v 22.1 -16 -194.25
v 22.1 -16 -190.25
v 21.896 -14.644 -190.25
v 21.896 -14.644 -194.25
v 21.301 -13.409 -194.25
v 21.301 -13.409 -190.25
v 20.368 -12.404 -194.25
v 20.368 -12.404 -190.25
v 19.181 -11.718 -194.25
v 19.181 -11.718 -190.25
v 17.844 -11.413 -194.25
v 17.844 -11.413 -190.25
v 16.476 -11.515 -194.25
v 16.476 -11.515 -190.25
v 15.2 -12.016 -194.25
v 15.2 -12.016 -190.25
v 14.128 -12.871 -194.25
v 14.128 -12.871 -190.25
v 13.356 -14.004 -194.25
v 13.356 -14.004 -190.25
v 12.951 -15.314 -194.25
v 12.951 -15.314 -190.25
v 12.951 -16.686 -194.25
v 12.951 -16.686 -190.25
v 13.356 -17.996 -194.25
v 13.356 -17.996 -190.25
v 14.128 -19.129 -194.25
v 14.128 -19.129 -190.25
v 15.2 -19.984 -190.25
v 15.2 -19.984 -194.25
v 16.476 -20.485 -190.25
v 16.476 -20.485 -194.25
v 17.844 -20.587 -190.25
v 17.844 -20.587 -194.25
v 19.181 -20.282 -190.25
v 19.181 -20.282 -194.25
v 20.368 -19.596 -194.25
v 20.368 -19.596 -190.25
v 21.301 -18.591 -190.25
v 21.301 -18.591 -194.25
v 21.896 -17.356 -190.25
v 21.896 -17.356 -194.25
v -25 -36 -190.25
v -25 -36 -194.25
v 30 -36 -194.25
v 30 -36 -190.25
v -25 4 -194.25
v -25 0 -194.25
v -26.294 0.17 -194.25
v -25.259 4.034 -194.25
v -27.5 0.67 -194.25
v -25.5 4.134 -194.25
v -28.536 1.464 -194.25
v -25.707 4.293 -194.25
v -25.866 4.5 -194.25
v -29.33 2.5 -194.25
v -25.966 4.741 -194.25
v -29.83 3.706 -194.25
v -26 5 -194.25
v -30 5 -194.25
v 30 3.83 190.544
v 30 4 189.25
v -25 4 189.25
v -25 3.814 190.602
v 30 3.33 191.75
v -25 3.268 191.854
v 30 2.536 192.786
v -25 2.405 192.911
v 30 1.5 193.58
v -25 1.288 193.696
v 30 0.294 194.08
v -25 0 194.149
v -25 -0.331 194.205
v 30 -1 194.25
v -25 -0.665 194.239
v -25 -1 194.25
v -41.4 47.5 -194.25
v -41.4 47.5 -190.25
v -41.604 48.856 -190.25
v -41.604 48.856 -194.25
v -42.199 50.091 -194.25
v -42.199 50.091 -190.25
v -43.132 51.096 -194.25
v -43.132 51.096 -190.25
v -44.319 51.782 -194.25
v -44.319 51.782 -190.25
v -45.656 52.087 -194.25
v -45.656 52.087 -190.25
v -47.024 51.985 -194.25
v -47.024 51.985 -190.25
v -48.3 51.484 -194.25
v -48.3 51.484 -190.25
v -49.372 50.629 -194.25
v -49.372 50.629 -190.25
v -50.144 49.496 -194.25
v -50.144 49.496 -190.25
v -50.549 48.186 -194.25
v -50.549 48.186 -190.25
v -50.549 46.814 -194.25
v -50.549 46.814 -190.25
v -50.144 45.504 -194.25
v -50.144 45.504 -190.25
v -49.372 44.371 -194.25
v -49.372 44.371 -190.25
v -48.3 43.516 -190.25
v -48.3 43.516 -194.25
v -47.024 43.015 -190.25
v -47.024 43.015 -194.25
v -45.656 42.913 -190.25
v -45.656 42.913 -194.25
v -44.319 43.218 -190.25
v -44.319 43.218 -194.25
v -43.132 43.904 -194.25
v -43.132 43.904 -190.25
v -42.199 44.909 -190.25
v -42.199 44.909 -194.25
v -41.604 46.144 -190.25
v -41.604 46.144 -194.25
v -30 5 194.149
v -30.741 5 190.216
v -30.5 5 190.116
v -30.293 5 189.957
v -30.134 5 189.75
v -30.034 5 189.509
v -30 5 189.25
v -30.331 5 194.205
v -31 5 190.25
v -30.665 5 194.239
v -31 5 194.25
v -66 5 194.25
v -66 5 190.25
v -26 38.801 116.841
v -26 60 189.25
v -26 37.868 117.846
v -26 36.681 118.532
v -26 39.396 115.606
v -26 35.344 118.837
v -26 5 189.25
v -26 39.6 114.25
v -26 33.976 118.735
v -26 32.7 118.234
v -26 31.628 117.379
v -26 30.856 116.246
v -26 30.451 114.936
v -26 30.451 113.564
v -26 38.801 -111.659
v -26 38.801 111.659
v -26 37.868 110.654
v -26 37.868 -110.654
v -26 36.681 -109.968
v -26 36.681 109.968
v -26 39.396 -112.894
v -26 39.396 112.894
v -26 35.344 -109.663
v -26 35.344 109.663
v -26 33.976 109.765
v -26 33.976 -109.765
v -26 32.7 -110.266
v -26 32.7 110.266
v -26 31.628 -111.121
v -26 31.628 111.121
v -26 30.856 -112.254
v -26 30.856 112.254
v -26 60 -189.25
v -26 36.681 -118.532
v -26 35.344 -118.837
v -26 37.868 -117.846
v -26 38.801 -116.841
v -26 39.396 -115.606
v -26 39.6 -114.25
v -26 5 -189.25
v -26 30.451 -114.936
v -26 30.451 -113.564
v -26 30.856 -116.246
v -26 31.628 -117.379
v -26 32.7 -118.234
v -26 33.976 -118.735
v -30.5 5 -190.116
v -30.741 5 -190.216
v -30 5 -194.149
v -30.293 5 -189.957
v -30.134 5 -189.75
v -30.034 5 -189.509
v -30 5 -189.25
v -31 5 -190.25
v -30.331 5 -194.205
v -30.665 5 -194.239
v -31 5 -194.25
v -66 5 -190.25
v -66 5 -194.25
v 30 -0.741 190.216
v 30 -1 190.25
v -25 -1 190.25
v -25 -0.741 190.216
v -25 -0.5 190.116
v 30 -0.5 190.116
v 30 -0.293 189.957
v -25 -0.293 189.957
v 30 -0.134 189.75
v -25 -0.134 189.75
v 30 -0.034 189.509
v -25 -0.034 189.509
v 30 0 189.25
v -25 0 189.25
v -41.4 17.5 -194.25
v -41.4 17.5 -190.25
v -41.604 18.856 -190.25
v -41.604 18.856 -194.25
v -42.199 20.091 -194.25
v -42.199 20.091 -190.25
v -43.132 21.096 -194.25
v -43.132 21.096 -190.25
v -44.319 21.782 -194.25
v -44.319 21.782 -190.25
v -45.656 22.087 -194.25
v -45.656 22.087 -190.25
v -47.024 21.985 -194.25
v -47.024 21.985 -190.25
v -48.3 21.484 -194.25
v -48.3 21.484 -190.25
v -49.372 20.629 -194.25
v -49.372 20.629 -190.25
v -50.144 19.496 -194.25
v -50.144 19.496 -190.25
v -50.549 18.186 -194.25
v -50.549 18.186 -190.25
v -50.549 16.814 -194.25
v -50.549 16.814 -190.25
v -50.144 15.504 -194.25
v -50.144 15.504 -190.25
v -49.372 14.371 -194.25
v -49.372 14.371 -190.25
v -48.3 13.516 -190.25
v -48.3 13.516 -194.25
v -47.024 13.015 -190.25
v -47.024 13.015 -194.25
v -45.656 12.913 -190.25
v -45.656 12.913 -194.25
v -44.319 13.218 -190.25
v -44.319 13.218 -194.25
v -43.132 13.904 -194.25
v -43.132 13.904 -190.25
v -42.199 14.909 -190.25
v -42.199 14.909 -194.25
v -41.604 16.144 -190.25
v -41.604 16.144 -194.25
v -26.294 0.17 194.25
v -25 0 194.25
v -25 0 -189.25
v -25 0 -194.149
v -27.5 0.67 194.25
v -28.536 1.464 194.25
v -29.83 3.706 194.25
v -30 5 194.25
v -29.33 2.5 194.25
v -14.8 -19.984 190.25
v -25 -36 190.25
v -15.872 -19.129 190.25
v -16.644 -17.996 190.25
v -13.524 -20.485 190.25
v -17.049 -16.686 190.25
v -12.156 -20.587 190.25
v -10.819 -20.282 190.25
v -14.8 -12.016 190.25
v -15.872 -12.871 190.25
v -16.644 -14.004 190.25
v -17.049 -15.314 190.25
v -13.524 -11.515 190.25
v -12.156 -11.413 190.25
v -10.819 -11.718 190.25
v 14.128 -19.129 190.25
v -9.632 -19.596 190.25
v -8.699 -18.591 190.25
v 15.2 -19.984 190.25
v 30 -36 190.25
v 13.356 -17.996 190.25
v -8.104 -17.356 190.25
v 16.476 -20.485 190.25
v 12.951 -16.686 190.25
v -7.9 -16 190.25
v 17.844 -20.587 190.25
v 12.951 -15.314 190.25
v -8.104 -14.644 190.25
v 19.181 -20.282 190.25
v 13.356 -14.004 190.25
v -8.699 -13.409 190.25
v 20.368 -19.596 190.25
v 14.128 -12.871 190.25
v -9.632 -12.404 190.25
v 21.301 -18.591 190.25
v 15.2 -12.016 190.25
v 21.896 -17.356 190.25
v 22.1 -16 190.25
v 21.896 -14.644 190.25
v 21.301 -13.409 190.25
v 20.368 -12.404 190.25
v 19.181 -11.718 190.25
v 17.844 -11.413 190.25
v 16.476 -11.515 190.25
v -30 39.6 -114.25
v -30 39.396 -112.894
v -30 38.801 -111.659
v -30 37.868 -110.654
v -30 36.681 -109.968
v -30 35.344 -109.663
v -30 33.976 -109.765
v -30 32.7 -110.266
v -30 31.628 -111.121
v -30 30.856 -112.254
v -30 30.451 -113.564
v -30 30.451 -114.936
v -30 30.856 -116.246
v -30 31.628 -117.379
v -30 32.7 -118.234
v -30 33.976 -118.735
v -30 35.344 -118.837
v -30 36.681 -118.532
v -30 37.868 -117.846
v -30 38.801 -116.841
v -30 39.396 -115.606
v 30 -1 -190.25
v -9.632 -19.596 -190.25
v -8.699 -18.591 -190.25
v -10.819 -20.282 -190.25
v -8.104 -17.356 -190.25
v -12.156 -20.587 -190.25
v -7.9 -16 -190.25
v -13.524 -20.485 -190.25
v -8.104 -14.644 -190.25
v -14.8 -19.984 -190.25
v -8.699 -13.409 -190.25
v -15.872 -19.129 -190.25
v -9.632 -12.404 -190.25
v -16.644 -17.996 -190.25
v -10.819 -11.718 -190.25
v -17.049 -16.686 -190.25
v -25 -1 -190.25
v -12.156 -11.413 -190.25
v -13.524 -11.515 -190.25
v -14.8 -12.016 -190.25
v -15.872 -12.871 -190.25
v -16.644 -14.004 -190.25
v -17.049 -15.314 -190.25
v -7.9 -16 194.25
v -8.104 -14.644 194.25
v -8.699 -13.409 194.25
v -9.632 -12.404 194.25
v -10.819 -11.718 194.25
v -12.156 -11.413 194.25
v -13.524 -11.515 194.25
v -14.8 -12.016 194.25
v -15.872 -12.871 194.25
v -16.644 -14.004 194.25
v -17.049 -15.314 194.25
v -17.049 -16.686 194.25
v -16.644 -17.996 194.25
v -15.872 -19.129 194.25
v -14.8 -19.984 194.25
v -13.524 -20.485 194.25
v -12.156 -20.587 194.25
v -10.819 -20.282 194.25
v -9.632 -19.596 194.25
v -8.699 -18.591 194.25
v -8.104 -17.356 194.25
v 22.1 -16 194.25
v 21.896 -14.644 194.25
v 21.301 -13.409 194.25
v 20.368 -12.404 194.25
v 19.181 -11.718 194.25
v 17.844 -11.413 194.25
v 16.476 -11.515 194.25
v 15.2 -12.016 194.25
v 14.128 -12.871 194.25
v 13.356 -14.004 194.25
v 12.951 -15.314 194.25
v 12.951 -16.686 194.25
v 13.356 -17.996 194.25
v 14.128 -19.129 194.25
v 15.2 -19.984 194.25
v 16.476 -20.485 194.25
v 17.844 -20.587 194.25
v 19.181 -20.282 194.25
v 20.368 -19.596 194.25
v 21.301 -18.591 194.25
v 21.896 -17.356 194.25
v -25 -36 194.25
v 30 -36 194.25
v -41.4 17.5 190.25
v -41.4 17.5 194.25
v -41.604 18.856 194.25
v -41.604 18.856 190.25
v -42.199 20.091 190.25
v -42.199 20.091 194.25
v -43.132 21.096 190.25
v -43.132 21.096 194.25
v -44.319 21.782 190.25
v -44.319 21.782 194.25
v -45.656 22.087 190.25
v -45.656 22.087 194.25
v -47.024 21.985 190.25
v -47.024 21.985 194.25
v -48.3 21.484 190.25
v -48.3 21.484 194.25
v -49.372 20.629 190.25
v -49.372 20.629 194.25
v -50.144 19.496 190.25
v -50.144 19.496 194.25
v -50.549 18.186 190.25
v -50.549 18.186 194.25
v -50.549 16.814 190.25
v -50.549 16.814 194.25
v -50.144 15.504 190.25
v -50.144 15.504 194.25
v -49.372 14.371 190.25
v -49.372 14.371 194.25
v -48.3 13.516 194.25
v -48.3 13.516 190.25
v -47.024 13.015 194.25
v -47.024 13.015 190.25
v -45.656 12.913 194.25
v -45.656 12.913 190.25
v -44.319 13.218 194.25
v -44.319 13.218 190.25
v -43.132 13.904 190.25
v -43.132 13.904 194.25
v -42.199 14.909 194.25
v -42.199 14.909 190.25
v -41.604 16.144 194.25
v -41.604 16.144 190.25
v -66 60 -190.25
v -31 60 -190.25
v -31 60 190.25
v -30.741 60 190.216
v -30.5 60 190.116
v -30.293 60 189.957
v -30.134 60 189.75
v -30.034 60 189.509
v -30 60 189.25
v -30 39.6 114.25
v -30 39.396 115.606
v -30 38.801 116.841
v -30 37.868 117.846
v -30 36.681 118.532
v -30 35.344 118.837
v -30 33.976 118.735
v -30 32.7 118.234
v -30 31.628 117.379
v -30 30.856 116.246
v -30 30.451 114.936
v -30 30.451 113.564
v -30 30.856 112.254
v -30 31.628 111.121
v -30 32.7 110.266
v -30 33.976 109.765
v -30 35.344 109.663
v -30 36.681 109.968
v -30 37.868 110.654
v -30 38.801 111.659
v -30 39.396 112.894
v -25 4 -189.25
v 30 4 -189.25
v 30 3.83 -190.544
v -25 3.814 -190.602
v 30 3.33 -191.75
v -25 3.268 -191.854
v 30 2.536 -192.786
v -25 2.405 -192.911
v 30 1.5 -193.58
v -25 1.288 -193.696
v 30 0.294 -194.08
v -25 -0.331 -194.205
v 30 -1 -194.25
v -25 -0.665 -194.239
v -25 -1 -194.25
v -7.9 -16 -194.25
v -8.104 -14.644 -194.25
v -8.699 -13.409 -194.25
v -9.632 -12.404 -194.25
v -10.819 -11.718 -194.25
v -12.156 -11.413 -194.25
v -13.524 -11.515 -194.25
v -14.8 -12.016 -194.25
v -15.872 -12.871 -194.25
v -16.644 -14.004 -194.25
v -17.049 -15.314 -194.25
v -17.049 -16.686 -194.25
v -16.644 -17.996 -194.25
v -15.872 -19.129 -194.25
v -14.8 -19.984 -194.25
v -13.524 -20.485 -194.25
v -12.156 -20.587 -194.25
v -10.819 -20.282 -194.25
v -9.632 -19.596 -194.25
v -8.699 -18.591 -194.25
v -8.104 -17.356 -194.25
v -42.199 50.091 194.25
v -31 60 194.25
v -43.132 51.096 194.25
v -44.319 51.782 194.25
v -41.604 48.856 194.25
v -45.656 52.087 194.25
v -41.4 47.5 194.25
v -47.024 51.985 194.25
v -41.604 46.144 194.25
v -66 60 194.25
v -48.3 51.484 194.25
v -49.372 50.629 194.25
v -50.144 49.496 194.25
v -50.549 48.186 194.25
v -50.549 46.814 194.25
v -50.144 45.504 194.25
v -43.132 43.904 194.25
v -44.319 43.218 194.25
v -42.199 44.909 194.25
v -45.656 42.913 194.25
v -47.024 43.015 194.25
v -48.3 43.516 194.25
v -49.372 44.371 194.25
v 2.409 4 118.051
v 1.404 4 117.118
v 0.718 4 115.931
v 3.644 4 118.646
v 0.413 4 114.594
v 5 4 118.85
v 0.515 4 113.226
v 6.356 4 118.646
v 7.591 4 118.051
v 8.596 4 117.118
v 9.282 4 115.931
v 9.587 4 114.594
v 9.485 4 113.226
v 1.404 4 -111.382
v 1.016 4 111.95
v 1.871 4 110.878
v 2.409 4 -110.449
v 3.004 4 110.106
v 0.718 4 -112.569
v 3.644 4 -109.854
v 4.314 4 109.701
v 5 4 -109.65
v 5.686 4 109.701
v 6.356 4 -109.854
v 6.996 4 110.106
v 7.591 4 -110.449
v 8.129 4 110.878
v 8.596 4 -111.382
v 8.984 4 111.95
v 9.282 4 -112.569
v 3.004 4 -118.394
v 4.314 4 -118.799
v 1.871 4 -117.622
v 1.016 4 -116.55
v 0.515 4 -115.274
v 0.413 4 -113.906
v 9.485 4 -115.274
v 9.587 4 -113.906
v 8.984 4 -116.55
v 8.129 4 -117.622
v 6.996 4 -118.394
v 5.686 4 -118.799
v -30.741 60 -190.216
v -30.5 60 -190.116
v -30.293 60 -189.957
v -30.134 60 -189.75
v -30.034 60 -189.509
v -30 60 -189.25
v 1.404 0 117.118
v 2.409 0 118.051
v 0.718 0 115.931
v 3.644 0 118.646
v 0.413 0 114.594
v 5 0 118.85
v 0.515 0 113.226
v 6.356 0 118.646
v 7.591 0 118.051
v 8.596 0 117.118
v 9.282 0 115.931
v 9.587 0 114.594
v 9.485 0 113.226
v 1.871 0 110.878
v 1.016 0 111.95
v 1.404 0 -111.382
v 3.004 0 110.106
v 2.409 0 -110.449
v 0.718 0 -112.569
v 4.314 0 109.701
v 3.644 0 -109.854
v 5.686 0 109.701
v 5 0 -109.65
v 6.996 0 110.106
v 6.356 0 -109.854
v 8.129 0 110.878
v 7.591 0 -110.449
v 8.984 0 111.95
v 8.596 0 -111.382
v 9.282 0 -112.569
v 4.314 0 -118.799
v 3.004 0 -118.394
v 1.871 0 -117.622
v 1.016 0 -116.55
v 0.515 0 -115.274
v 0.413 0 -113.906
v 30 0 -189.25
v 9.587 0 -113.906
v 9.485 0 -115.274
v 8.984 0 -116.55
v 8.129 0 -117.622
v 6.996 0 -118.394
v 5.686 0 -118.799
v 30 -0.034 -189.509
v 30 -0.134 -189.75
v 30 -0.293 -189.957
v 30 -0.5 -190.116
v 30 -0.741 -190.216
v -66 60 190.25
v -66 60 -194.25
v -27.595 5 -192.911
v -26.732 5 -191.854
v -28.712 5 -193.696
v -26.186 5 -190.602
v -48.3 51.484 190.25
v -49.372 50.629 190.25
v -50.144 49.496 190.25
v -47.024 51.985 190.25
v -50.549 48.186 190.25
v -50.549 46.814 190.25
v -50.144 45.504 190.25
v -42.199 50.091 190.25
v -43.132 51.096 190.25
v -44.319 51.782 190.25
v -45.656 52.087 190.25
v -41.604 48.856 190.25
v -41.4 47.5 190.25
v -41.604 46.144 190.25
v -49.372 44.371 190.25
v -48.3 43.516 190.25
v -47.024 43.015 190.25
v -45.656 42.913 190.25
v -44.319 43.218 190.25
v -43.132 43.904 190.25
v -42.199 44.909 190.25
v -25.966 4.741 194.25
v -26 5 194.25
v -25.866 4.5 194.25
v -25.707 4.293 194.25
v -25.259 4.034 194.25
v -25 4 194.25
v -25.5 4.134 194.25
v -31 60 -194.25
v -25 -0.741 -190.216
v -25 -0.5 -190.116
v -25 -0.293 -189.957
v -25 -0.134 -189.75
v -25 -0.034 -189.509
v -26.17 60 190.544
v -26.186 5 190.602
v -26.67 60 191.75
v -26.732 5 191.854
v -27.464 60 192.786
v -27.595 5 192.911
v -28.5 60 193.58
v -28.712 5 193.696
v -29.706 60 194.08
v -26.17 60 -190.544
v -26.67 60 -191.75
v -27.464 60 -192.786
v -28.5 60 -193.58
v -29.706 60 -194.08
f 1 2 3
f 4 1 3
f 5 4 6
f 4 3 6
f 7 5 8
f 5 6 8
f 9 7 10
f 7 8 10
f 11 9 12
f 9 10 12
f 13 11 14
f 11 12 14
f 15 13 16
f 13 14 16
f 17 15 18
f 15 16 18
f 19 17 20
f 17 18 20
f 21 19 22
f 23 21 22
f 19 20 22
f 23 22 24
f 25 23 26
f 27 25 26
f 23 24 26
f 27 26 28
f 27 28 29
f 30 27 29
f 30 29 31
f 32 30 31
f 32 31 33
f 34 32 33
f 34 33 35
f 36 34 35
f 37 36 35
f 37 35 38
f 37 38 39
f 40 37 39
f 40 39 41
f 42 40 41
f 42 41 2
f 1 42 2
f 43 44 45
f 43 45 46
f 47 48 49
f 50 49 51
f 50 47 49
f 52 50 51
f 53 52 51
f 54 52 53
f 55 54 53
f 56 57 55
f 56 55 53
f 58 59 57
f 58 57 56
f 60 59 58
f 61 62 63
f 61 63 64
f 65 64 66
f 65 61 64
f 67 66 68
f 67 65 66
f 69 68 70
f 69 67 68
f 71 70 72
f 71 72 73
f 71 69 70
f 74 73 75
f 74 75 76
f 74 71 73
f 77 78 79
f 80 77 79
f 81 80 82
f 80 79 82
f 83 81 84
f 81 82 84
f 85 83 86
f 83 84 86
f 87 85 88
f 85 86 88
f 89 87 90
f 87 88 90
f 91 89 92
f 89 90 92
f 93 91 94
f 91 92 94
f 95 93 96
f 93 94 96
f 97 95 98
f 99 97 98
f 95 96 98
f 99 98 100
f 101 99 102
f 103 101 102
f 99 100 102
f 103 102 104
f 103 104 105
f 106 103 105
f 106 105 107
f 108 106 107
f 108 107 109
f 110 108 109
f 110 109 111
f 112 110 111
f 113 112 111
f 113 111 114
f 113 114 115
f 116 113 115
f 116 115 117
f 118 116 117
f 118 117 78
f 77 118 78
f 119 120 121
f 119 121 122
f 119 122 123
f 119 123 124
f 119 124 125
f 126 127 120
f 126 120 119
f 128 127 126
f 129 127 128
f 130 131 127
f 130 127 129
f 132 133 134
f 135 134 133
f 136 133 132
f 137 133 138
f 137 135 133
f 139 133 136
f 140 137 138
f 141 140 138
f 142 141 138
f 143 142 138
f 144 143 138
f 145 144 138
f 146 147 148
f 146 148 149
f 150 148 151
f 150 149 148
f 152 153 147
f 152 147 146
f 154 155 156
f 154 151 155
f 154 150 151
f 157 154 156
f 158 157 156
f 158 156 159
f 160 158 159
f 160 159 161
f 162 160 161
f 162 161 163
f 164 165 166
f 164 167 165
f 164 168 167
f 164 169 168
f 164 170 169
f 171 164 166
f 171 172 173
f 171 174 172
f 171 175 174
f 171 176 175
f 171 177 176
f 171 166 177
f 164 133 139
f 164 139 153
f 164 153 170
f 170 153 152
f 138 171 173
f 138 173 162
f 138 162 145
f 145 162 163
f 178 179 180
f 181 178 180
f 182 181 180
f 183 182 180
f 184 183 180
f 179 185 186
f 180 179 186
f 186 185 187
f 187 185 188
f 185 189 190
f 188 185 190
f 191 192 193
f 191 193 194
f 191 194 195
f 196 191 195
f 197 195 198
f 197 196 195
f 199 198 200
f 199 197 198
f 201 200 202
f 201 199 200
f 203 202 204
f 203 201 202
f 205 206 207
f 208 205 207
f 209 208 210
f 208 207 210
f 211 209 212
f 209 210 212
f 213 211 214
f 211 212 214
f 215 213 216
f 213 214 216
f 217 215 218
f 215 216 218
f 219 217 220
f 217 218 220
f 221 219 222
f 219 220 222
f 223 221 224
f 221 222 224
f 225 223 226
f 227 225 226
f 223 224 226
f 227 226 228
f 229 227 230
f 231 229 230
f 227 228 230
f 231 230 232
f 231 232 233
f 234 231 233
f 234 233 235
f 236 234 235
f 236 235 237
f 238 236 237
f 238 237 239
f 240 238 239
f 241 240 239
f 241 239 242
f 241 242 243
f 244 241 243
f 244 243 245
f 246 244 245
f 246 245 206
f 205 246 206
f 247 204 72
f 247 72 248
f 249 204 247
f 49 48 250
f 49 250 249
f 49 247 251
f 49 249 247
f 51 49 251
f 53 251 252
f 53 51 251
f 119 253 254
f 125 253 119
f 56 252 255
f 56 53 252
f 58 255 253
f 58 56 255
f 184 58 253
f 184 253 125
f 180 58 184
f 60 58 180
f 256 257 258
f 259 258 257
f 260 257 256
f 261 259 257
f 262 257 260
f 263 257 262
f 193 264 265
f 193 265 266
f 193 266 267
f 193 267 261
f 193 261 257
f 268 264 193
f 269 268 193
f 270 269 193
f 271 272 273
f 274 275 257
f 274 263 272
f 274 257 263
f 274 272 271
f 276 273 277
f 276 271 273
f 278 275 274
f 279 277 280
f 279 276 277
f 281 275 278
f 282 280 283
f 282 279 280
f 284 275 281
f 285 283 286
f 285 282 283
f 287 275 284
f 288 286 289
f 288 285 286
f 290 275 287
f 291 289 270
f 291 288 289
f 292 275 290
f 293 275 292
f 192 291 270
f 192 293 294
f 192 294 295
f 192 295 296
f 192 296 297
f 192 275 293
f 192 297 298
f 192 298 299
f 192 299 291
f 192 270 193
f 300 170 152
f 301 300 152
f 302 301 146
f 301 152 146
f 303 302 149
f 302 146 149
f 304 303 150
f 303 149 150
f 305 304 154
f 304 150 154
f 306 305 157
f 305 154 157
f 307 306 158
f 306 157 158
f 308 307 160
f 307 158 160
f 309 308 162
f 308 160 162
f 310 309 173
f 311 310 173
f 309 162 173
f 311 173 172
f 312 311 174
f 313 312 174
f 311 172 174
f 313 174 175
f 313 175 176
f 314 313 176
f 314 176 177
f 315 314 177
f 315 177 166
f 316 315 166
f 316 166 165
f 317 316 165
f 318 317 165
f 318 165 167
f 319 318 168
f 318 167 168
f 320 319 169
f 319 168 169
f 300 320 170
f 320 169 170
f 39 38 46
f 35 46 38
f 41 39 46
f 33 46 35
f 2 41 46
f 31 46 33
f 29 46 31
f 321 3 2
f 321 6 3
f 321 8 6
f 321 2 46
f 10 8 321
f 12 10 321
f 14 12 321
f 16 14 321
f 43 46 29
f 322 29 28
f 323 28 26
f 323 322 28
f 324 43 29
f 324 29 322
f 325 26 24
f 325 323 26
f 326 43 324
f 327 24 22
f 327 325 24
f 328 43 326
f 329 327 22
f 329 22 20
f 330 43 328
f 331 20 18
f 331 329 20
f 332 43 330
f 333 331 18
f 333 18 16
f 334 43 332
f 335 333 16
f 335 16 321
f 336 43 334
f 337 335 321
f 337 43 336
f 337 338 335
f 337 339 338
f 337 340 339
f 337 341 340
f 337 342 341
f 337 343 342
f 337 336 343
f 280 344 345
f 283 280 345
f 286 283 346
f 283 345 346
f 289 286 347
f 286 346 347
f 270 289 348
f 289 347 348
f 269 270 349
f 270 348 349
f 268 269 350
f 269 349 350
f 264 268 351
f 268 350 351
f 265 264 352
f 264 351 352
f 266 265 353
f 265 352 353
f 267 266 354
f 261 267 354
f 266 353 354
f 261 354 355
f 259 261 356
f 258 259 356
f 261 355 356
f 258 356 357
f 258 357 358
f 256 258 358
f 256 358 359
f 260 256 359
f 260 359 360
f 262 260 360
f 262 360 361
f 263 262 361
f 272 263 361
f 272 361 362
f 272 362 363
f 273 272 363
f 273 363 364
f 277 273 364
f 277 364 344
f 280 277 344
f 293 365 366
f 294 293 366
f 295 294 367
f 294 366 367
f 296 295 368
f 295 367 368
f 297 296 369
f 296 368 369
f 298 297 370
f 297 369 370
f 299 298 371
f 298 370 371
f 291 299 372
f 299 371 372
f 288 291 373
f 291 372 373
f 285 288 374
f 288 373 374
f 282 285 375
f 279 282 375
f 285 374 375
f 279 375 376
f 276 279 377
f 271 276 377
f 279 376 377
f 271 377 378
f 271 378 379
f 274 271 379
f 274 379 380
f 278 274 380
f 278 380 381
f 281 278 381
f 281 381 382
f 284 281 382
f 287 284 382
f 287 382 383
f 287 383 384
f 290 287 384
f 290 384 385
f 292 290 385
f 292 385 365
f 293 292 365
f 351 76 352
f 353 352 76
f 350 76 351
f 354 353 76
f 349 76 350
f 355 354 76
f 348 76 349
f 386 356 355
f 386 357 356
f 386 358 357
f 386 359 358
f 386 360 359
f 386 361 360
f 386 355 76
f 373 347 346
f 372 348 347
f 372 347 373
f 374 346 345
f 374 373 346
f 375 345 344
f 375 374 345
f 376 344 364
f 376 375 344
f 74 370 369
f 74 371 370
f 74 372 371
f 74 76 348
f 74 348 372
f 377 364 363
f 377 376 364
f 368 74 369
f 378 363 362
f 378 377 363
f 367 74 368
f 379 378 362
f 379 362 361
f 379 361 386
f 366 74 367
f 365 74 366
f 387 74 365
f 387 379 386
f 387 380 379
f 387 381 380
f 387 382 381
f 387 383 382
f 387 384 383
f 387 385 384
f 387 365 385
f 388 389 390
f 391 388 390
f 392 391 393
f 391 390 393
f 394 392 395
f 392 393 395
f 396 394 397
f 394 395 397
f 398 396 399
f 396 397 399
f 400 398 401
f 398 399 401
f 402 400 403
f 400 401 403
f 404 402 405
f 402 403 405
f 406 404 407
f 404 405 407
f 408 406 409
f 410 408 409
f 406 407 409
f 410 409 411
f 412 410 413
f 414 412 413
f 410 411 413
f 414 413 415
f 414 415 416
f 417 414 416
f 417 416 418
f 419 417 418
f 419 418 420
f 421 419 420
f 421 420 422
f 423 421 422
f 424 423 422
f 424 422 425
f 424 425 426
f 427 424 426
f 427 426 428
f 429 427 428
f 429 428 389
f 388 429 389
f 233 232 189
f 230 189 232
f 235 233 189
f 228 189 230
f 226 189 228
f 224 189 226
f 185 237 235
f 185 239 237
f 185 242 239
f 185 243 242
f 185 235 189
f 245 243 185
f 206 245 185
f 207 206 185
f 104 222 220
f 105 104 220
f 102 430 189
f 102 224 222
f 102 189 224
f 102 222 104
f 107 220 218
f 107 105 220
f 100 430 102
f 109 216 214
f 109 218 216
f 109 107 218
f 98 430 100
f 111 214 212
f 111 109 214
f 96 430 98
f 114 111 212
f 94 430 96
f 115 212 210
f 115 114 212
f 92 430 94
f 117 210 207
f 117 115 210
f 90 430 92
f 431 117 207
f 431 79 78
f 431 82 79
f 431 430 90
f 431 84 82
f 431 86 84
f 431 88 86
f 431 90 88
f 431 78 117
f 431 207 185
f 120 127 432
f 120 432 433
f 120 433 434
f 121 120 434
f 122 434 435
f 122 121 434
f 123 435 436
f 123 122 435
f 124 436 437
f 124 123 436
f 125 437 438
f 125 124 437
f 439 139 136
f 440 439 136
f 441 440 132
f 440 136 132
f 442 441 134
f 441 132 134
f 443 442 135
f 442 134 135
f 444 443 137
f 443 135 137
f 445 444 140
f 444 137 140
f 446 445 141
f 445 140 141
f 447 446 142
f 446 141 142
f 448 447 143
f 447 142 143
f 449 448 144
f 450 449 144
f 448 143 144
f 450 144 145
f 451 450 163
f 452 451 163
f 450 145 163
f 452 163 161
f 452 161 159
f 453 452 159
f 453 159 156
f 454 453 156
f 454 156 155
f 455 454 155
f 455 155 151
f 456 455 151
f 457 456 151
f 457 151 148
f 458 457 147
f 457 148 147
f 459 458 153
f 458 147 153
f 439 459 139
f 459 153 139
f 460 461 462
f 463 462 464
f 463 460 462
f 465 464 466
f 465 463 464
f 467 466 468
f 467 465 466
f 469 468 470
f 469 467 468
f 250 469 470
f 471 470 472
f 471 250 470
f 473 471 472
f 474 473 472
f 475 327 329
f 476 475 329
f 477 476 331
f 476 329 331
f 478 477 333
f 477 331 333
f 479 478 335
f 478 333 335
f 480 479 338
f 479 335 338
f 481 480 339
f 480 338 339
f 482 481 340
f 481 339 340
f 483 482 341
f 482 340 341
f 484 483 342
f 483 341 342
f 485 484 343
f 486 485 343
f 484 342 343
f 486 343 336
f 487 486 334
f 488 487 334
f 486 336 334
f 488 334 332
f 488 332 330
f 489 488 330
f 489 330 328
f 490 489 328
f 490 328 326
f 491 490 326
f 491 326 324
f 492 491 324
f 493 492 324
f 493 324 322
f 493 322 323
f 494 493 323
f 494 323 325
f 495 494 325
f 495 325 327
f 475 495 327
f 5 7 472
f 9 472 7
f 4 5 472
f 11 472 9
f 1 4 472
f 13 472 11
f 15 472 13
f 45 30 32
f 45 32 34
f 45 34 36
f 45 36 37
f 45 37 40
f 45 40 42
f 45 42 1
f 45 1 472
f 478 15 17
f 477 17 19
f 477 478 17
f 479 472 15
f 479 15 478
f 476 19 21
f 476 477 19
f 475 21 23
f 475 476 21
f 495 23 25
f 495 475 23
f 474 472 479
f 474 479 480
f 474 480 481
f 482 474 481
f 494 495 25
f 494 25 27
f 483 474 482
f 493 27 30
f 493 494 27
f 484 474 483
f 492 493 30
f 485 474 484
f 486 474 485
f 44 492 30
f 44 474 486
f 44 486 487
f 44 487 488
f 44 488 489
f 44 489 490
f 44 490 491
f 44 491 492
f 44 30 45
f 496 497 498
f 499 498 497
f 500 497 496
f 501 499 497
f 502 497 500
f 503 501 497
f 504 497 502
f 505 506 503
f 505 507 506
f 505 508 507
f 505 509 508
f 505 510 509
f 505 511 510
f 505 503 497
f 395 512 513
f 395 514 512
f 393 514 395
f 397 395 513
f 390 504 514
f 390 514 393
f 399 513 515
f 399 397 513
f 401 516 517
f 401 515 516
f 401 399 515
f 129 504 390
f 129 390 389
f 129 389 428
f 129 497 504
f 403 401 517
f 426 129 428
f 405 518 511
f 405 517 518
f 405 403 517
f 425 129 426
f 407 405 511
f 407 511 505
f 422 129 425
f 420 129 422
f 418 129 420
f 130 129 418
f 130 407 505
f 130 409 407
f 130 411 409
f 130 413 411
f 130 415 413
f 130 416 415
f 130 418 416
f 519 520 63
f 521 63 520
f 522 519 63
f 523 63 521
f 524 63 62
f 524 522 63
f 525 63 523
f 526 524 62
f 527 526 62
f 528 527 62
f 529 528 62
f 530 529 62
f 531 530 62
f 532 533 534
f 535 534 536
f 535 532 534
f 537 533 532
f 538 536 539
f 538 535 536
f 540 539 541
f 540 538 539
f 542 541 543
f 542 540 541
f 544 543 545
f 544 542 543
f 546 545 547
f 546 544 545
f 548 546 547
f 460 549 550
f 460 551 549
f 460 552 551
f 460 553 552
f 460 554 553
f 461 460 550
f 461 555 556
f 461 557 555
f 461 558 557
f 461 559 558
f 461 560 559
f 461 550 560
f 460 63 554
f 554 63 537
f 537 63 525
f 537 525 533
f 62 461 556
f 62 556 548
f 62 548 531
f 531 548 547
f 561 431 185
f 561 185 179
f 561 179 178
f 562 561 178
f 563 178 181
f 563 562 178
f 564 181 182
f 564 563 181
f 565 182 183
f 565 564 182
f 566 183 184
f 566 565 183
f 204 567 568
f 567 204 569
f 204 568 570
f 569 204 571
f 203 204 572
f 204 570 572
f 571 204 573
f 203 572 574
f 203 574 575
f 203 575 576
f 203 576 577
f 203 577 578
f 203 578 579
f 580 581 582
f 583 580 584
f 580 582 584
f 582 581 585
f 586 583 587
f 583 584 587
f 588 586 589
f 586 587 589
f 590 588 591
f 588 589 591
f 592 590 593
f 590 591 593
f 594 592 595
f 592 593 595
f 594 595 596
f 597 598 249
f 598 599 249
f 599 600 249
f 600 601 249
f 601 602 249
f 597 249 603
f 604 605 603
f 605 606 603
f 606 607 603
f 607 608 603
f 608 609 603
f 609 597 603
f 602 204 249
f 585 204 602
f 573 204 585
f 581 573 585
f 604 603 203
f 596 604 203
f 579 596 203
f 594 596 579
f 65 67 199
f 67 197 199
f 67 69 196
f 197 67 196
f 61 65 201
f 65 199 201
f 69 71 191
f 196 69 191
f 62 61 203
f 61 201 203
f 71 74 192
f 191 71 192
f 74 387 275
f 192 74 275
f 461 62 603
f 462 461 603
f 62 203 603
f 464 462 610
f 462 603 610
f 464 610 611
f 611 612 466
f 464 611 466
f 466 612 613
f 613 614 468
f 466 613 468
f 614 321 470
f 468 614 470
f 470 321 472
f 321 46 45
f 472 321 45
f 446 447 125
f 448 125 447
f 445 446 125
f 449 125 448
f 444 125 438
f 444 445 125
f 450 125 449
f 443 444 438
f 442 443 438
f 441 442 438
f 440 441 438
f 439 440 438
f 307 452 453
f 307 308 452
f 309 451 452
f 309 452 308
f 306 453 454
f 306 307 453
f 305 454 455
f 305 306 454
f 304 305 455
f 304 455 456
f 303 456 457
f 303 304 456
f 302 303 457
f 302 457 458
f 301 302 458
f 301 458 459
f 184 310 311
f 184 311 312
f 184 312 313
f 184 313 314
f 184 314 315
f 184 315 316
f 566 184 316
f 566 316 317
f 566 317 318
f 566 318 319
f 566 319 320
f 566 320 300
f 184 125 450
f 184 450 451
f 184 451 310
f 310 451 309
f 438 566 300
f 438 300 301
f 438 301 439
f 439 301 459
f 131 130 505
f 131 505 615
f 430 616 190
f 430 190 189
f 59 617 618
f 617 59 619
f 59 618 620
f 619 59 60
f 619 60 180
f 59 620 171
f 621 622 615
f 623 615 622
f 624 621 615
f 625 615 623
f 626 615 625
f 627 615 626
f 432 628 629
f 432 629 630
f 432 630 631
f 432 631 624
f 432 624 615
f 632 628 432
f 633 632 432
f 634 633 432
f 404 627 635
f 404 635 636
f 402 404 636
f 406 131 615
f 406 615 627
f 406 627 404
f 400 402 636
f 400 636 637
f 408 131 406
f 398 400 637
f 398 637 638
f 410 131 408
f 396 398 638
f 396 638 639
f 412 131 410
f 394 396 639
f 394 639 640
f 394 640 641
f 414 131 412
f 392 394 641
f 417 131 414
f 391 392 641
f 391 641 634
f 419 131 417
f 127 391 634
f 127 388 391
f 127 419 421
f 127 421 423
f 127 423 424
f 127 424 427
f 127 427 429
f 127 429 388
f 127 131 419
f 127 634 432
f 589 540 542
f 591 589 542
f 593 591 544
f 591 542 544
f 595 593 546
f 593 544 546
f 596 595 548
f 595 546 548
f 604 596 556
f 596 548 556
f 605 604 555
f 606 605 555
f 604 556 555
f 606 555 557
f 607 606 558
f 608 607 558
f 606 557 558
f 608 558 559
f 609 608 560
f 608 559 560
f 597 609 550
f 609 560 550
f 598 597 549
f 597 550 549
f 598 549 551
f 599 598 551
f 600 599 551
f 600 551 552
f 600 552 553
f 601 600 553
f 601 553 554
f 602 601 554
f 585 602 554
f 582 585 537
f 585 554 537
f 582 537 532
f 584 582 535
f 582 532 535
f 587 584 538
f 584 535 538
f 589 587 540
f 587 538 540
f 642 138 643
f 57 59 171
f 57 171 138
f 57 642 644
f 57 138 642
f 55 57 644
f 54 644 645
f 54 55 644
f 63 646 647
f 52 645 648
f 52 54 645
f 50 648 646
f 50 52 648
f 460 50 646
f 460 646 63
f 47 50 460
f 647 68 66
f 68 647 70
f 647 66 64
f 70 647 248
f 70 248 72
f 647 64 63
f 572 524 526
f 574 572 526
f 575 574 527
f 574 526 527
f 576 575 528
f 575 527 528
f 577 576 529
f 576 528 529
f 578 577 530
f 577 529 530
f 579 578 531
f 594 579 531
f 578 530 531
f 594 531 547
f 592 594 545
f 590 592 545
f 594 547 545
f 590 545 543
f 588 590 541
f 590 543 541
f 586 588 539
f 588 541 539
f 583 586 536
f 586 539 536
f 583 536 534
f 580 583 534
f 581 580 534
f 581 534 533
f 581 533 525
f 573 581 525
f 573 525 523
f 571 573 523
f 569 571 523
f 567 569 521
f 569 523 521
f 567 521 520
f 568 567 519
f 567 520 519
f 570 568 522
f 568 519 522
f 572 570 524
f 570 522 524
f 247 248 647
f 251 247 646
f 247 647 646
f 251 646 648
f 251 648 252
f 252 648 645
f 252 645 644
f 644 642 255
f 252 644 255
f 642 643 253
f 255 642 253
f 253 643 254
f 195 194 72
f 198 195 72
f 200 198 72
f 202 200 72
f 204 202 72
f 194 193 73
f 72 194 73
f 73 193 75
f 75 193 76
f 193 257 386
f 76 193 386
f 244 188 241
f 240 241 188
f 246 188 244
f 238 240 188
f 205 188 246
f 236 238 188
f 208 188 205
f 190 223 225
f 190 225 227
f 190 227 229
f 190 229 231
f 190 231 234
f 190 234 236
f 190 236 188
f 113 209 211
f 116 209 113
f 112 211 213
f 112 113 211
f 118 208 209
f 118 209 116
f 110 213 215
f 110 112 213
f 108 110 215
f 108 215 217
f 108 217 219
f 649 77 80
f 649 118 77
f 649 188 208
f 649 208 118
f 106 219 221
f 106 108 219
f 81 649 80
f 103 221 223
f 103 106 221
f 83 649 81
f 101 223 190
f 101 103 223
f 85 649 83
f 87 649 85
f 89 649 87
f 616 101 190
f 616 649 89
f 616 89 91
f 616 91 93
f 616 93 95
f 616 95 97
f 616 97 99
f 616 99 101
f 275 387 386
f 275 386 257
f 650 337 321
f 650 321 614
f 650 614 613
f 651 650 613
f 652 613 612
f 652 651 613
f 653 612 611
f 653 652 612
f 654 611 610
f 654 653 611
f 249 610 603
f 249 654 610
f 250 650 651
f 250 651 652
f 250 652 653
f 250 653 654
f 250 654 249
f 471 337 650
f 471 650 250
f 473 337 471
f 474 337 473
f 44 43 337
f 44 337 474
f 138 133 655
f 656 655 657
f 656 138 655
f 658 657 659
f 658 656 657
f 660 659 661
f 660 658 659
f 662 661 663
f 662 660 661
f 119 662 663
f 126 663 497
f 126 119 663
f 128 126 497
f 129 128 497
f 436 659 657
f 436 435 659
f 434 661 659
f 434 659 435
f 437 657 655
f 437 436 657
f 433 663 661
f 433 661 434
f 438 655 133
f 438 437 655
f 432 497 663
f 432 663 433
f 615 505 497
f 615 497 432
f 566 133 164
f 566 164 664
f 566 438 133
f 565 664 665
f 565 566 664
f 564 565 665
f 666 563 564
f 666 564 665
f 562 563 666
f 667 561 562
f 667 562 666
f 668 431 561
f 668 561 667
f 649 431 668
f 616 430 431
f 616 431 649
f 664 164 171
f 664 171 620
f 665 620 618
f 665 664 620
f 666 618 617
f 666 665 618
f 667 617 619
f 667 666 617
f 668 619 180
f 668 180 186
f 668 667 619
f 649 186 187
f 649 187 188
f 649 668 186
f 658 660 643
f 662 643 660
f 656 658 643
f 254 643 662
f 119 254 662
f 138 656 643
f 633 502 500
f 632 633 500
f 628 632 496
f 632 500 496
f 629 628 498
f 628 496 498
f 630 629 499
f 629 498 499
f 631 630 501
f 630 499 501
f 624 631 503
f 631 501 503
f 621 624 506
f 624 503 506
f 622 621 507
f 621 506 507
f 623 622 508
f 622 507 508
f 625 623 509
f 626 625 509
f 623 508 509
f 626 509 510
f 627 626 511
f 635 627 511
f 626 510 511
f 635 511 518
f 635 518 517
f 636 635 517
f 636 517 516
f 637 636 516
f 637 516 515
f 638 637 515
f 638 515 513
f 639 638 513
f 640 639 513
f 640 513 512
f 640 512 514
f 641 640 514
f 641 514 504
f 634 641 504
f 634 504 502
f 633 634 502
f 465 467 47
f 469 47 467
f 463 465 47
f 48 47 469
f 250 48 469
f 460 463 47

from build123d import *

# Parameters (mm, degrees)
SKETCH1_W                      = 60
SKETCH1_H                      = 388.5
BASE_FLANGE1_DEPTH             = 4
EDGE_FLANGE1_STRIP_W           = 18
EDGE_FLANGE1_STRIP_H           = 4
EDGE_FLANGE1_STRIP_CUT_DEPTH   = 388.5
EDGE_FLANGE1_DEPTH             = 388.5
EDGE_FLANGE2_STRIP_W           = 18
EDGE_FLANGE2_STRIP_H           = 4
EDGE_FLANGE2_STRIP_CUT_DEPTH   = 55
EDGE_FLANGE2_STRIP_2_W         = 18
EDGE_FLANGE2_STRIP_2_H         = 4
EDGE_FLANGE2_STRIP_CUT_2_DEPTH = 55
EDGE_FLANGE2_STRIP_3_W         = 18
EDGE_FLANGE2_STRIP_3_H         = 4
EDGE_FLANGE2_STRIP_CUT_3_DEPTH = 55
EDGE_FLANGE2_STRIP_4_W         = 18
EDGE_FLANGE2_STRIP_4_H         = 4
EDGE_FLANGE2_STRIP_CUT_4_DEPTH = 55
EDGE_FLANGE2_DEPTH             = 55
EDGE_FLANGE2_BEND_DEPTH        = 55
EDGE_FLANGE2_BEND_2_DEPTH      = 55
EDGE_FLANGE2_BEND_3_DEPTH      = 55
SKETCH18_R                     = 4.6
EXTRUDE1_DEPTH                 = 399.607890037
SKETCH19_R                     = 4.6
EXTRUDE2_DEPTH                 = 4
SKETCH20_R                     = 4.6
EXTRUDE3_DEPTH                 = 4


# Sheet-metal steps are written as plain solids
with BuildPart() as part:
    # Sketch1 → Base-Flange1 (new body)
    with BuildSketch(Plane(origin=(0, 0, 0), x_dir=(1, 0, 0), z_dir=(0, 1, 0))):
        Rectangle(SKETCH1_W, SKETCH1_H)
    extrude(amount=BASE_FLANGE1_DEPTH)

    # Edge-Flange1 strip (across the edge) → Edge-Flange1 strip cut (cut)
    with BuildSketch(Plane(origin=(-30, 4, -194.25), x_dir=(1, 0, 0), z_dir=(0, 0, 1))):
        with Locations((-4, -2)):
            Rectangle(EDGE_FLANGE1_STRIP_W, EDGE_FLANGE1_STRIP_H)
    extrude(amount=EDGE_FLANGE1_STRIP_CUT_DEPTH, mode=Mode.SUBTRACT)

    # Edge-Flange1 section (across the edge) → Edge-Flange1 (add)
    with BuildSketch(Plane(origin=(-30, 4, -194.25), x_dir=(1, 0, 0), z_dir=(0, 0, 1))):
        with BuildLine():
            Line((0, 1), (0, 56))
            Line((0, 56), (4, 56))
            Line((4, 56), (4, 1))
            ThreePointArc((4, 1), (4.292893219, 0.292893219), (5, 0))
            Line((5, 0), (5, -4))
            ThreePointArc((5, -4), (1.464466094, -2.535533906), (0, 1))
        make_face()
    extrude(amount=EDGE_FLANGE1_DEPTH)

    # Edge-Flange2 strip (across the edge) → Edge-Flange2 strip cut (cut)
    with BuildSketch(Plane(origin=(-30, 5, 194.25), x_dir=(0, 0, -1), z_dir=(0, 1, 0))):
        with Locations((-4, -2)):
            Rectangle(EDGE_FLANGE2_STRIP_W, EDGE_FLANGE2_STRIP_H)
    extrude(amount=EDGE_FLANGE2_STRIP_CUT_DEPTH, mode=Mode.SUBTRACT)

    # Edge-Flange2 strip 2 (across the edge) → Edge-Flange2 strip cut 2 (cut)
    with BuildSketch(Plane(origin=(30, 0, 194.25), x_dir=(0, 0, -1), z_dir=(-1, 0, 0))):
        with Locations((-4, -2)):
            Rectangle(EDGE_FLANGE2_STRIP_2_W, EDGE_FLANGE2_STRIP_2_H)
    extrude(amount=EDGE_FLANGE2_STRIP_CUT_2_DEPTH, mode=Mode.SUBTRACT)

    # Edge-Flange2 strip 3 (across the edge) → Edge-Flange2 strip cut 3 (cut)
    with BuildSketch(Plane(origin=(-30, 60, -194.25), x_dir=(0, 0, 1), z_dir=(0, -1, 0))):
        with Locations((-4, -2)):
            Rectangle(EDGE_FLANGE2_STRIP_3_W, EDGE_FLANGE2_STRIP_3_H)
    extrude(amount=EDGE_FLANGE2_STRIP_CUT_3_DEPTH, mode=Mode.SUBTRACT)

    # Edge-Flange2 strip 4 (across the edge) → Edge-Flange2 strip cut 4 (cut)
    with BuildSketch(Plane(origin=(-25, 0, -194.25), x_dir=(0, 0, 1), z_dir=(1, 0, 0))):
        with Locations((-4, -2)):
            Rectangle(EDGE_FLANGE2_STRIP_4_W, EDGE_FLANGE2_STRIP_4_H)
    extrude(amount=EDGE_FLANGE2_STRIP_CUT_4_DEPTH, mode=Mode.SUBTRACT)

    # Edge-Flange2 section (across the edge) → Edge-Flange2 (add)
    with BuildSketch(Plane(origin=(-30, 5, 194.25), x_dir=(0, 0, -1), z_dir=(0, 1, 0))):
        with BuildLine():
            Line((0, 1), (0, 36))
            Line((0, 36), (4, 36))
            Line((4, 36), (4, 1))
            ThreePointArc((4, 1), (4.292893219, 0.292893219), (5, 0))
            Line((5, 0), (5, -4))
            ThreePointArc((5, -4), (1.464466094, -2.535533906), (0, 1))
        make_face()
    extrude(amount=EDGE_FLANGE2_DEPTH)

    # Edge-Flange2 section 2 (across the edge) → Edge-Flange2 bend (add)
    with BuildSketch(Plane(origin=(30, 0, 194.25), x_dir=(0, 0, -1), z_dir=(-1, 0, 0))):
        with BuildLine():
            Line((0, 1), (0, 36))
            Line((0, 36), (4, 36))
            Line((4, 36), (4, 1))
            ThreePointArc((4, 1), (4.292893219, 0.292893219), (5, 0))
            Line((5, 0), (5, -4))
            ThreePointArc((5, -4), (1.464466094, -2.535533906), (0, 1))
        make_face()
    extrude(amount=EDGE_FLANGE2_BEND_DEPTH)

    # Edge-Flange2 section 3 (across the edge) → Edge-Flange2 bend 2 (add)
    with BuildSketch(Plane(origin=(-30, 60, -194.25), x_dir=(0, 0, 1), z_dir=(0, -1, 0))):
        with BuildLine():
            Line((0, 1), (0, 36))
            Line((0, 36), (4, 36))
            Line((4, 36), (4, 1))
            ThreePointArc((4, 1), (4.292893219, 0.292893219), (5, 0))
            Line((5, 0), (5, -4))
            ThreePointArc((5, -4), (1.464466094, -2.535533906), (0, 1))
        make_face()
    extrude(amount=EDGE_FLANGE2_BEND_2_DEPTH)

    # Edge-Flange2 section 4 (across the edge) → Edge-Flange2 bend 3 (add)
    with BuildSketch(Plane(origin=(-25, 0, -194.25), x_dir=(0, 0, 1), z_dir=(1, 0, 0))):
        with BuildLine():
            Line((0, 1), (0, 36))
            Line((0, 36), (4, 36))
            Line((4, 36), (4, 1))
            ThreePointArc((4, 1), (4.292893219, 0.292893219), (5, 0))
            Line((5, 0), (5, -4))
            ThreePointArc((5, -4), (1.464466094, -2.535533906), (0, 1))
        make_face()
    extrude(amount=EDGE_FLANGE2_BEND_3_DEPTH)

    # Sketch18 → Extrude1 (cut, through all)
    with BuildSketch(Plane.XY.offset(194.25)):
        with Locations((-46, 47.5)):
            Circle(SKETCH18_R)
        with Locations((-46, 17.5)):
            Circle(SKETCH18_R)
        with Locations((-12.5, -16)):
            Circle(SKETCH18_R)
        with Locations((17.5, -16)):
            Circle(SKETCH18_R)
    extrude(amount=-EXTRUDE1_DEPTH, mode=Mode.SUBTRACT)

    # Sketch19 → Extrude2 (cut)
    with BuildSketch(Plane(origin=(-26, 0, 0), x_dir=(0, 0, -1), z_dir=(1, 0, 0))):
        with Locations(Location((-114.25, 35, 0), (0, 0, 90))):
            Circle(SKETCH19_R)
        with Locations(Location((114.25, 35, 0), (0, 0, 90))):
            Circle(SKETCH19_R)
    extrude(amount=-EXTRUDE2_DEPTH, mode=Mode.SUBTRACT)

    # Sketch20 → Extrude3 (cut)
    with BuildSketch(Plane(origin=(0, 4, 0), x_dir=(1, 0, 0), z_dir=(0, 1, 0))):
        with Locations(Location((5, 114.25, 0), (0, 0, 270))):
            Circle(SKETCH20_R)
        with Locations(Location((5, -114.25, 0), (0, 0, 270))):
            Circle(SKETCH20_R)
    extrude(amount=-EXTRUDE3_DEPTH, mode=Mode.SUBTRACT)


solid = part.part
